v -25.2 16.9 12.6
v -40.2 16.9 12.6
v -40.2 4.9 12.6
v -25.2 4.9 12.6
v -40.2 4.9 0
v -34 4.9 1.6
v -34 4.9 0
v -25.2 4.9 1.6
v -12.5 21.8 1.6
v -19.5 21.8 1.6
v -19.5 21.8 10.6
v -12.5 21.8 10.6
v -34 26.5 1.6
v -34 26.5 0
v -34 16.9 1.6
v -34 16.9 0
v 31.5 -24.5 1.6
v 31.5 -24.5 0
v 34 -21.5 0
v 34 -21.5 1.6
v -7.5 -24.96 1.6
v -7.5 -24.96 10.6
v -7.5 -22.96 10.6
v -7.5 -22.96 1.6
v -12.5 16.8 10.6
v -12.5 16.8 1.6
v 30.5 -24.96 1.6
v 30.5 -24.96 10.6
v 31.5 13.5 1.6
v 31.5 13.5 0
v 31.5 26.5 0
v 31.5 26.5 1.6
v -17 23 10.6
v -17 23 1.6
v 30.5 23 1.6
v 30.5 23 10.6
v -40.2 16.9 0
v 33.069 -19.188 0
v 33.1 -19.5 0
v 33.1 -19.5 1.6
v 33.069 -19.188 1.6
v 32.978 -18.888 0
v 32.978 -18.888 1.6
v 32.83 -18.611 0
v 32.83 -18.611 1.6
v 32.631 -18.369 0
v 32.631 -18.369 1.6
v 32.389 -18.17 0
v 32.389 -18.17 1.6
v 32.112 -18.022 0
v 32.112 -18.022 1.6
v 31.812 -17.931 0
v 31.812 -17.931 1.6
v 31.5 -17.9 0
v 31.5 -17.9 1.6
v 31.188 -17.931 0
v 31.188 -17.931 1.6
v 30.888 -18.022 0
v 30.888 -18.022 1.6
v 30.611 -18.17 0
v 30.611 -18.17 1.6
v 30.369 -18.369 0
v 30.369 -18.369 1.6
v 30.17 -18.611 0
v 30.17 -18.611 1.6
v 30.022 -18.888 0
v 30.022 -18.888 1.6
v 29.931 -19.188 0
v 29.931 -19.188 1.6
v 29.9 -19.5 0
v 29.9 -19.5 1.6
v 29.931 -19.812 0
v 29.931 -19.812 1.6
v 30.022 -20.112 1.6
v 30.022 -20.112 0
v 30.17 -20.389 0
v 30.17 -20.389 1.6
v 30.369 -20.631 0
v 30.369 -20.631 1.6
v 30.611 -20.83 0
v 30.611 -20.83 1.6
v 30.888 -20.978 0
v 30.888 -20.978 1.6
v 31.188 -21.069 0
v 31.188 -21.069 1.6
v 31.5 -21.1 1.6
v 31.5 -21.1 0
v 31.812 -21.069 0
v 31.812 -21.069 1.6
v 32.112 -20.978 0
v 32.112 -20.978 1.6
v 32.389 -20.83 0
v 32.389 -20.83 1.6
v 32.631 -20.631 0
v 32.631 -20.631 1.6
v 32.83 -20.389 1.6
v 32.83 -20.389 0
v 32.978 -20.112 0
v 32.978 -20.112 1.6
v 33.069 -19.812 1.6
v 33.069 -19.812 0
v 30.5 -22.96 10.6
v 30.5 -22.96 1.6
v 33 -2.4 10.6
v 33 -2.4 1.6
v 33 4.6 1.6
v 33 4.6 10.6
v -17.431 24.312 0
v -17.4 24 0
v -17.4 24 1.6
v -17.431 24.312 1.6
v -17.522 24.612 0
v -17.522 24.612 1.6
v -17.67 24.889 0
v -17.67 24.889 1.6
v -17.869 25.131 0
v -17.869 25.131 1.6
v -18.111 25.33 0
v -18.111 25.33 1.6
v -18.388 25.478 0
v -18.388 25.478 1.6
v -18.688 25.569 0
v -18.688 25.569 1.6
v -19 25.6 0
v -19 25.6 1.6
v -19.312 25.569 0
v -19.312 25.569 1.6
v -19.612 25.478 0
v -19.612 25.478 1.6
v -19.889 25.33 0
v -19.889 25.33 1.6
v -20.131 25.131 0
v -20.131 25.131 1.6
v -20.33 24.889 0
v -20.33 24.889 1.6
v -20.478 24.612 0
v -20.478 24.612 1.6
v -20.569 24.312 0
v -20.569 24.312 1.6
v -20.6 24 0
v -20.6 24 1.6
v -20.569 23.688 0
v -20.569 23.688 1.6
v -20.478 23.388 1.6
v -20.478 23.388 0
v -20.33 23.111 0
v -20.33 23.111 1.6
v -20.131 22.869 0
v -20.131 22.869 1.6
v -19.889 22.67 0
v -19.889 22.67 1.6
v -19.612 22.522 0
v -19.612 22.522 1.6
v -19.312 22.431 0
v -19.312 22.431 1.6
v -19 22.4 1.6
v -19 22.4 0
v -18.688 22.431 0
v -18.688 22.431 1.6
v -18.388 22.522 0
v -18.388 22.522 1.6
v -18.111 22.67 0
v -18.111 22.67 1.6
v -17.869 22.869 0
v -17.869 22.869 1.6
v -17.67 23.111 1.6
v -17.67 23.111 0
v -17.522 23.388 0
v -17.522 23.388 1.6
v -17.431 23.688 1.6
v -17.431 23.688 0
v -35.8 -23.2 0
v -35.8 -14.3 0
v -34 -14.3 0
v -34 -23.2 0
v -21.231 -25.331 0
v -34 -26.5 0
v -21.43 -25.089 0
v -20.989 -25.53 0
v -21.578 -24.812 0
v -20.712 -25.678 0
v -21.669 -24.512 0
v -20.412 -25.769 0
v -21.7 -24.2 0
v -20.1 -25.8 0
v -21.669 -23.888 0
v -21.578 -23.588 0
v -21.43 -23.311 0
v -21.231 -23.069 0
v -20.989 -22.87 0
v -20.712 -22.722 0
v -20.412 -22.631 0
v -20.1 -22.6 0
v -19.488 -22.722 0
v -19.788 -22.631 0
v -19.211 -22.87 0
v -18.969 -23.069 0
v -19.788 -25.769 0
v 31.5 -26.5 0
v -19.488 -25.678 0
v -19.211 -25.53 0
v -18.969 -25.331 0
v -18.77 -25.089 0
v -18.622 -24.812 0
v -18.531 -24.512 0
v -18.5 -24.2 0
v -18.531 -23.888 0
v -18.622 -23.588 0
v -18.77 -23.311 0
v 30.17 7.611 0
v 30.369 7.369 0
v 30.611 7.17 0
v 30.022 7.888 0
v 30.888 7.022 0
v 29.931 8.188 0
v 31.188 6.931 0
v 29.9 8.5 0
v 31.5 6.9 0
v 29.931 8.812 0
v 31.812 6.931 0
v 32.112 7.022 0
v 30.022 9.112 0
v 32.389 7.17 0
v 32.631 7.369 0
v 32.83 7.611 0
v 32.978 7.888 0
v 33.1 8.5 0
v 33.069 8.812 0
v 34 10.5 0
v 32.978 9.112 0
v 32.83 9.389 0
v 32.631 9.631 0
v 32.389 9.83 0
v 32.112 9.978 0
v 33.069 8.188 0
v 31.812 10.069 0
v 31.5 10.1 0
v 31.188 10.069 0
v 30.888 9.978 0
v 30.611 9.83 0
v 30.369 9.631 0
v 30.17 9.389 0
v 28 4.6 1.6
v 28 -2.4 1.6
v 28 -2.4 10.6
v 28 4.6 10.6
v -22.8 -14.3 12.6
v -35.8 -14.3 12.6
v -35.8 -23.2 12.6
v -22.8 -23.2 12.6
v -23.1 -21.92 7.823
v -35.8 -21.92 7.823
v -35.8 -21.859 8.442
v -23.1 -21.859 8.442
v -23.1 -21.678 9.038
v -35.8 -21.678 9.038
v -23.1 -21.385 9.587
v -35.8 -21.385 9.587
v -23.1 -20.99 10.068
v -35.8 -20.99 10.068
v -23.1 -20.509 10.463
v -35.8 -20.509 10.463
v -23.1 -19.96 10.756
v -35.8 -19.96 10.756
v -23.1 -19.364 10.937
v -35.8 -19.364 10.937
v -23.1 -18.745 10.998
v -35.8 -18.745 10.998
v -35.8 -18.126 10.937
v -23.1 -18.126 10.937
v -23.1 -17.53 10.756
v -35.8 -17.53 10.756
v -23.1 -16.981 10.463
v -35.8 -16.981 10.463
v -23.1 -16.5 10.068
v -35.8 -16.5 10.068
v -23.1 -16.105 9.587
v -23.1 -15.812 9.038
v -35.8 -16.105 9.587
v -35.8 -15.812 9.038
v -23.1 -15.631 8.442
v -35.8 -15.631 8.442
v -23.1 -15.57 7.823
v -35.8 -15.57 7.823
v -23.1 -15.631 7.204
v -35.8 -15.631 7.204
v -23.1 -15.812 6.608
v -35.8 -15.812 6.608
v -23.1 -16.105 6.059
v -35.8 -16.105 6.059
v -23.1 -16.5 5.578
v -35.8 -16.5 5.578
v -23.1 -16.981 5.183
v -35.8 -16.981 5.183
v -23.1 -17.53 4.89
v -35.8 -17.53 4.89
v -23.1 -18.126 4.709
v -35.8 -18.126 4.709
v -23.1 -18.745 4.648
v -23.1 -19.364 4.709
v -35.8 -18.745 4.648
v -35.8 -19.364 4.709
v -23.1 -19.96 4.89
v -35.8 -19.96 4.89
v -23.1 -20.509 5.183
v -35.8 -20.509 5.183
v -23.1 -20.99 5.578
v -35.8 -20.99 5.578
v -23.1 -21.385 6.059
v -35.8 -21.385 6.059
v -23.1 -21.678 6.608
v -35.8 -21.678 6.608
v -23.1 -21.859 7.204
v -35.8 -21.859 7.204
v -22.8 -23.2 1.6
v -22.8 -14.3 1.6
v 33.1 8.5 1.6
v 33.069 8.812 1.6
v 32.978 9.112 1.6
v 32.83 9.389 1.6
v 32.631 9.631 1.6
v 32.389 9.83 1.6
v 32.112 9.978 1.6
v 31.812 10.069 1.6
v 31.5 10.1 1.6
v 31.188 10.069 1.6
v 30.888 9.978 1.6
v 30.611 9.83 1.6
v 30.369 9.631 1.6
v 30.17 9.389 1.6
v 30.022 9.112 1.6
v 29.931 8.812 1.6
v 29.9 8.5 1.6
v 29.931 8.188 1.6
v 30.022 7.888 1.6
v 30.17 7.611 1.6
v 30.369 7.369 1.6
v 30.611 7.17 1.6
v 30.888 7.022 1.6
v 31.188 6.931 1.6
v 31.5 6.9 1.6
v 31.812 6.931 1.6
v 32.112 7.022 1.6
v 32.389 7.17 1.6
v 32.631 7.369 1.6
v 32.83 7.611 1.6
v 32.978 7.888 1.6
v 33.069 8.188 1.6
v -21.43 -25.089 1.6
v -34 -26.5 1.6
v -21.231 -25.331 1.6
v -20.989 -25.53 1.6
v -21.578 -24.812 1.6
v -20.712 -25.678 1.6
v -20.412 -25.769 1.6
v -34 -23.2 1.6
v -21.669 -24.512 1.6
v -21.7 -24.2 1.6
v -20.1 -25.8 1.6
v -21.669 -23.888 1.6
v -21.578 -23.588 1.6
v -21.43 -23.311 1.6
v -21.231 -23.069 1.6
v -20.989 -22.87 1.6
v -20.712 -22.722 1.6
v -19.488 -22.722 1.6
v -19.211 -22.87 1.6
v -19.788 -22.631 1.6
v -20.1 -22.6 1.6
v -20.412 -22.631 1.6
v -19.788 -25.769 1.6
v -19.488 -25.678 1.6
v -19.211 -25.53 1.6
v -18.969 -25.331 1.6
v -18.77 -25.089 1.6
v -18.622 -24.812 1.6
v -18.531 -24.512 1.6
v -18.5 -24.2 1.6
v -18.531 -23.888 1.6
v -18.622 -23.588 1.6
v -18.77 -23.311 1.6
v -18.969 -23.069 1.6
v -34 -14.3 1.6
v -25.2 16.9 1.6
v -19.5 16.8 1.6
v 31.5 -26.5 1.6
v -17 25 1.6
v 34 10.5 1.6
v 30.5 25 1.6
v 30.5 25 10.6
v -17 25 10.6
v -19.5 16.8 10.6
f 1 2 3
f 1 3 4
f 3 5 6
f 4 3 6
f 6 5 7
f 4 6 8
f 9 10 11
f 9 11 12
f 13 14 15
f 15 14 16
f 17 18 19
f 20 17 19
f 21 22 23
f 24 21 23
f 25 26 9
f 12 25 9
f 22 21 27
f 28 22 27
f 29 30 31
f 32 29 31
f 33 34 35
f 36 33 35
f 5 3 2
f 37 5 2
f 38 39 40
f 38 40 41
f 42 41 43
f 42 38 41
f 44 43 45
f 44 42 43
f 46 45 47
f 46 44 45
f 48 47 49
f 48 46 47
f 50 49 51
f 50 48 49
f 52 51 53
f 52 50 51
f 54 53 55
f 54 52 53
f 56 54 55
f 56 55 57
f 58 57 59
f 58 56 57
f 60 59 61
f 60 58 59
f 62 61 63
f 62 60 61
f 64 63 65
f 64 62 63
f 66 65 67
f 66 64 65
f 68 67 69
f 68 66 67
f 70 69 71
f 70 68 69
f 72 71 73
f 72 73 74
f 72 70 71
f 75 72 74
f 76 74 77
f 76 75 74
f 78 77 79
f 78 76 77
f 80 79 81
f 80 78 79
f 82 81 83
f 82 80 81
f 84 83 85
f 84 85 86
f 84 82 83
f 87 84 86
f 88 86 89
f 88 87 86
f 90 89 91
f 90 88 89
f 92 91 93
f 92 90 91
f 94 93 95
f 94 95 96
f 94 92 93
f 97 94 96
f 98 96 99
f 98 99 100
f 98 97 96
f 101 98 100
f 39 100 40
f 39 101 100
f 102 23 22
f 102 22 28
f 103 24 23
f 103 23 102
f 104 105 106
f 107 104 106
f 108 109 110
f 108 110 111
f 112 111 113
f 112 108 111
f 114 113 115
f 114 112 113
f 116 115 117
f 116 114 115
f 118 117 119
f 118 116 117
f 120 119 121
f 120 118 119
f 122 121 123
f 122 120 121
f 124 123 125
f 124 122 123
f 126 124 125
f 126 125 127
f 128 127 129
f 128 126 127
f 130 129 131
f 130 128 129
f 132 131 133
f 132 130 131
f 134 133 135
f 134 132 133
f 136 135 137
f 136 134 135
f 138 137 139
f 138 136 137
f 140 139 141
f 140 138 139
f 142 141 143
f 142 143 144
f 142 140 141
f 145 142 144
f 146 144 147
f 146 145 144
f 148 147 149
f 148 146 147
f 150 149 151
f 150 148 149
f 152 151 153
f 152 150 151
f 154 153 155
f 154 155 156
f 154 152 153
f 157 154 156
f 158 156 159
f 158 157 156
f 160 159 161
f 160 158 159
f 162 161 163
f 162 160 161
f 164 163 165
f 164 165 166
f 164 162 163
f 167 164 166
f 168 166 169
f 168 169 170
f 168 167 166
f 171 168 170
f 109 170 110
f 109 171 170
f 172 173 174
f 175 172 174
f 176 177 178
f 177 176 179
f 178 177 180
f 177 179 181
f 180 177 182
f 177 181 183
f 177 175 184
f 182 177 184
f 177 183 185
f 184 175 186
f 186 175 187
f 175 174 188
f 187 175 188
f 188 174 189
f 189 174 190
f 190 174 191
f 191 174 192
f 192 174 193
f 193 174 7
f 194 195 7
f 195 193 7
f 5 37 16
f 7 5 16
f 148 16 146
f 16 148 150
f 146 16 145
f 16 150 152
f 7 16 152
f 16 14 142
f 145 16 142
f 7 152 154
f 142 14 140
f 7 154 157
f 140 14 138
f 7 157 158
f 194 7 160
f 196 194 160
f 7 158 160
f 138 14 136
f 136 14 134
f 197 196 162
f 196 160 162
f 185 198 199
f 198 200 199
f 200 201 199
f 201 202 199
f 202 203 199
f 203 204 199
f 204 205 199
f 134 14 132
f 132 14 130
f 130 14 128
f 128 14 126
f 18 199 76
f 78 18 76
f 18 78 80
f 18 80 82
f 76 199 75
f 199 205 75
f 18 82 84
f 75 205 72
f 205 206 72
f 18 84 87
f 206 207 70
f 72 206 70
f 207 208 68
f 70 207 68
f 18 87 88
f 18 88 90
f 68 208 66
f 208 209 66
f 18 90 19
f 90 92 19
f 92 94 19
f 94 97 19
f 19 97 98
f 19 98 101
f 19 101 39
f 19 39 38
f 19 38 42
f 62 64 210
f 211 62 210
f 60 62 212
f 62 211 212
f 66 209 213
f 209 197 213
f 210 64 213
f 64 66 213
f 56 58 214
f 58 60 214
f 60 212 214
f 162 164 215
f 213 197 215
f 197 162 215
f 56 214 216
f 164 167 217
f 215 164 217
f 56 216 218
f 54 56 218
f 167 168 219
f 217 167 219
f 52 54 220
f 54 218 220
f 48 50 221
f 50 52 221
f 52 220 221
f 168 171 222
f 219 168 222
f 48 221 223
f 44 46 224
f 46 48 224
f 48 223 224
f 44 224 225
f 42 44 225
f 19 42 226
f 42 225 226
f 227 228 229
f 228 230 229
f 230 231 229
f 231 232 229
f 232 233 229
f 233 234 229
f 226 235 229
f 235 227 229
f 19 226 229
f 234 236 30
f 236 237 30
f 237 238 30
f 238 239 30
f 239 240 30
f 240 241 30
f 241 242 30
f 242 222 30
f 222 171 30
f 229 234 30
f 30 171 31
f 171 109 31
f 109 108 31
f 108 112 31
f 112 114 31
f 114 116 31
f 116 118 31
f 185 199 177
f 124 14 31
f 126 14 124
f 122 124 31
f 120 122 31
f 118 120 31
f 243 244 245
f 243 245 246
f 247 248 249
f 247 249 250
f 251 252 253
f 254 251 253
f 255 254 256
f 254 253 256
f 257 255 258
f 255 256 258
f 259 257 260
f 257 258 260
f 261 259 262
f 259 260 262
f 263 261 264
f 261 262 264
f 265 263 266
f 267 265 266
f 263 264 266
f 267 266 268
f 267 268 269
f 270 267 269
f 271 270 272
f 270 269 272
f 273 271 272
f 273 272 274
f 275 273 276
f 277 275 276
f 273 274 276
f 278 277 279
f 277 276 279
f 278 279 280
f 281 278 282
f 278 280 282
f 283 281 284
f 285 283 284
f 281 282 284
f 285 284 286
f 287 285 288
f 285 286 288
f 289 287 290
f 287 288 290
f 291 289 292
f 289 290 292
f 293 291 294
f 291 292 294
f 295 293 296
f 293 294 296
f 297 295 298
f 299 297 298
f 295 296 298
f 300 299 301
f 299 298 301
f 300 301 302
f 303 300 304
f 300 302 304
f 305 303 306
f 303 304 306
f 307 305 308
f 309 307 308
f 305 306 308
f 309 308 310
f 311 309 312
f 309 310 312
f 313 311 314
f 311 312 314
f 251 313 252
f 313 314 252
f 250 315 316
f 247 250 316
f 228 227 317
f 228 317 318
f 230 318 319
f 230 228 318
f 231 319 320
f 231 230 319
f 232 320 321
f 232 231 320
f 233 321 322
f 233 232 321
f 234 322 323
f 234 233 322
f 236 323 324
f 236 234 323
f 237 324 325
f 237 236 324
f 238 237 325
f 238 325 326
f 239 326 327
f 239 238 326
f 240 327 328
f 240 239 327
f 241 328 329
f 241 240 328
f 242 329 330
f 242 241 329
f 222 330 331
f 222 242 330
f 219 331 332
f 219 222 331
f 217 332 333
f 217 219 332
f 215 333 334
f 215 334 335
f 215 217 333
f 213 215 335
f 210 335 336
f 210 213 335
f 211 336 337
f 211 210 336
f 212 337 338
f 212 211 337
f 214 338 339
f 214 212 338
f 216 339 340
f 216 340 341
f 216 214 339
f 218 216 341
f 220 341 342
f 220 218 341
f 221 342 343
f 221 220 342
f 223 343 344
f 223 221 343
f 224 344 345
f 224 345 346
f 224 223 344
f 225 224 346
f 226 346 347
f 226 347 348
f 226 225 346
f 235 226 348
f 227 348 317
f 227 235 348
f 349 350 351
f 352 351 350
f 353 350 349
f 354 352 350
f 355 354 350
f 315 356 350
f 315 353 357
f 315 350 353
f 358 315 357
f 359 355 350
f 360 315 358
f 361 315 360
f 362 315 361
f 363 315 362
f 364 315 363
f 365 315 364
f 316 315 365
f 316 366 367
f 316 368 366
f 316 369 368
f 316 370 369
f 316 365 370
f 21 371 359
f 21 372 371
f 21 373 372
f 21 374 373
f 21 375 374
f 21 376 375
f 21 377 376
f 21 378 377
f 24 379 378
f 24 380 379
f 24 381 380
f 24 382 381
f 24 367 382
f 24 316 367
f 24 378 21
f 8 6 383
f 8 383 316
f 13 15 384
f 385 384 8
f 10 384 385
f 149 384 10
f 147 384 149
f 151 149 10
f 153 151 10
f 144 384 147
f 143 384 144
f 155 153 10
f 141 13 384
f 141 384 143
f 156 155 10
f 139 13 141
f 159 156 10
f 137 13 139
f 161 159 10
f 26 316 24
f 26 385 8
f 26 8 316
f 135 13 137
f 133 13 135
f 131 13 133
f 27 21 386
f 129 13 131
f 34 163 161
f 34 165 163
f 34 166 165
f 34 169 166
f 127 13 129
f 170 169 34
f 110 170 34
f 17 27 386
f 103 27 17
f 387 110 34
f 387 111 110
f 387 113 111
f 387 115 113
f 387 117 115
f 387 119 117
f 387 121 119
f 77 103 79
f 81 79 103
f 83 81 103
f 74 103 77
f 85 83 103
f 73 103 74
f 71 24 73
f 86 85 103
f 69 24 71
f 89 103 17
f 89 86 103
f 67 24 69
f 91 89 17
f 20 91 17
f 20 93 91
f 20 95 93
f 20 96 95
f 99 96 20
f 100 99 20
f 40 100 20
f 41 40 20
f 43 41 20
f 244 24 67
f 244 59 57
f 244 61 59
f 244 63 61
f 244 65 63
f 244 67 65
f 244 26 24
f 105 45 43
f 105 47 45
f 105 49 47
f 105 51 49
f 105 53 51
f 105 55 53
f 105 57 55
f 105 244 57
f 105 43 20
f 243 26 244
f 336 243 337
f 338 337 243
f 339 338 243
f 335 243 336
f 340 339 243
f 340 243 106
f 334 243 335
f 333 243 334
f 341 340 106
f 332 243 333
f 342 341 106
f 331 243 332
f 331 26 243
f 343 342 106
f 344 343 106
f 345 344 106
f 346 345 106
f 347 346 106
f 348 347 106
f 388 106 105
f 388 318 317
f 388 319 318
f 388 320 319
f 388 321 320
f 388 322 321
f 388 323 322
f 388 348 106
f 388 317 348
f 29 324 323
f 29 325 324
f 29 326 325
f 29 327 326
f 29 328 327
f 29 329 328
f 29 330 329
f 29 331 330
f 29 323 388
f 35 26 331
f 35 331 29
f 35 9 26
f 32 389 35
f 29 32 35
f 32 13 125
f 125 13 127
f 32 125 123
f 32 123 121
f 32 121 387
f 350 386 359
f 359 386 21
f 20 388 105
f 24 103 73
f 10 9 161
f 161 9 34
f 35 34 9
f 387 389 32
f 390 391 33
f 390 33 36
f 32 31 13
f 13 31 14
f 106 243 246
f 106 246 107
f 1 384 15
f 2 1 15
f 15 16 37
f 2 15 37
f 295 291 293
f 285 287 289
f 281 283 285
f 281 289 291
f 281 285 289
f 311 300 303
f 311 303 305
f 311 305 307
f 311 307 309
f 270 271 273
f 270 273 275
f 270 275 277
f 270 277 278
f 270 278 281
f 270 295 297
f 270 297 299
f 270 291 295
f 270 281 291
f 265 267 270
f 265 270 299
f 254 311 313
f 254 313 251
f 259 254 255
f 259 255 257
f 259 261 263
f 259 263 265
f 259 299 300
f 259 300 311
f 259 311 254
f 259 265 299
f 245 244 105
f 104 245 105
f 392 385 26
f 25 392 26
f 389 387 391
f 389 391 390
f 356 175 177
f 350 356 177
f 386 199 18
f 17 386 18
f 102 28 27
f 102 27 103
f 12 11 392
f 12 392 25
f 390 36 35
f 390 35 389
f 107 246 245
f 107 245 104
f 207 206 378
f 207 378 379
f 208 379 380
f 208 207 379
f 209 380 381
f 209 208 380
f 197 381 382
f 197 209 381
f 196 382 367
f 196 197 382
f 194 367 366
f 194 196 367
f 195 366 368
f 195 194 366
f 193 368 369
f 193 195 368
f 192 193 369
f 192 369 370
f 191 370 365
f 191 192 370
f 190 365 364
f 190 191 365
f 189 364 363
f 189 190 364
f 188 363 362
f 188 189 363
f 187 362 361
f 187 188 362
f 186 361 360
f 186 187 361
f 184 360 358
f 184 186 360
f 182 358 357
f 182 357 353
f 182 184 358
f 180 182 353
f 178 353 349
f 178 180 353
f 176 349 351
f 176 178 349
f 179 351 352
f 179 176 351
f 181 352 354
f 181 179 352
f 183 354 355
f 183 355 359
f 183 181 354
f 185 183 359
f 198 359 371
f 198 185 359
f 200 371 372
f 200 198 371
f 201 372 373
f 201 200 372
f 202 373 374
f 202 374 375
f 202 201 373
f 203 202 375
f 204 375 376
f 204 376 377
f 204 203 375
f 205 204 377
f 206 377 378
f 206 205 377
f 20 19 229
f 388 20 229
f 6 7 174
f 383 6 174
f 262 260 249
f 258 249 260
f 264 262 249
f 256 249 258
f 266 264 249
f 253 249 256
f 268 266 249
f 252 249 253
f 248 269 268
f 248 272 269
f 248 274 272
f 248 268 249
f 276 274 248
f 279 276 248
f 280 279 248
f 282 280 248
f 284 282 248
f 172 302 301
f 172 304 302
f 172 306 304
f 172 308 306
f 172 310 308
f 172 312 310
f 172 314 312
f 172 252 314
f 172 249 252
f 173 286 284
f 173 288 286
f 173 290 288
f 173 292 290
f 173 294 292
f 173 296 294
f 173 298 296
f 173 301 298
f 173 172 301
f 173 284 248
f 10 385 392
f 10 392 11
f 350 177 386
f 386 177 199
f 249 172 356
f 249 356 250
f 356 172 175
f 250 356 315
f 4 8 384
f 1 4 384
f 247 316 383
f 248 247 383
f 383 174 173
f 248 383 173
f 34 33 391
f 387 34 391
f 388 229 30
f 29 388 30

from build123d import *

# Parameters (mm, degrees)
F0_R     = 1.6
F0_W     = 38
F0_H     = 2
F0_W_2   = 7
F0_H_2   = 5
F0_W_3   = 5
F0_H_3   = 7
F0_W_4   = 47.5
F1_DEPTH = 1.6
F0_W_5   = 6.2
F0_H_4   = 12
F0_W_6   = 8.8
F0_W_7   = 1.8
F0_H_5   = 8.9
F0_W_8   = 11.2
F2_DEPTH = 12.6
F3_DEPTH = 10.6
F4_R     = 3.175
F5_DEPTH = 12.7


with BuildPart() as f1:
    # F0 (on Top) → F1 (new body)
    with BuildSketch(Plane.XY):
        Polygon((31.5, 13.5), (31.5, 26.5), (-34, 26.5), (-34, 16.9), (-25.2, 16.9), (-25.2, 4.9), (-34, 4.9), (-34, -14.3), (-22.8, -14.3), (-22.8, -23.2), (-34, -23.2), (-34, -26.5), (31.5, -26.5), (31.5, -24.5), (34, -21.5), (34, 10.5), align=None)
        with Locations((-20.1, -24.2)):
            Circle(F0_R, mode=Mode.SUBTRACT)
        with Locations((11.5, -23.96)):
            Rectangle(F0_W, F0_H, mode=Mode.SUBTRACT)
        with Locations((31.5, -19.5)):
            Circle(F0_R, mode=Mode.SUBTRACT)
        with Locations((-16, 19.3)):
            Rectangle(F0_W_2, F0_H_2, mode=Mode.SUBTRACT)
        with Locations((-19, 24)):
            Circle(F0_R, mode=Mode.SUBTRACT)
        with Locations((30.5, 1.1)):
            Rectangle(F0_W_3, F0_H_3, mode=Mode.SUBTRACT)
        with Locations((31.5, 8.5)):
            Circle(F0_R, mode=Mode.SUBTRACT)
        with Locations((6.75, 24)):
            Rectangle(F0_W_4, F0_H, mode=Mode.SUBTRACT)
    extrude(amount=F1_DEPTH)

    # F0 (on Top) → F2 (join)
    with BuildSketch(Plane.XY):
        with Locations((-37.1, 10.9)):
            Rectangle(F0_W_5, F0_H_4)
        with Locations((-29.6, 10.9)):
            Rectangle(F0_W_6, F0_H_4)
        with Locations((-34.9, -18.75)):
            Rectangle(F0_W_7, F0_H_5)
        with Locations((-28.4, -18.75)):
            Rectangle(F0_W_8, F0_H_5)
    extrude(amount=F2_DEPTH)

    # F0 (on Top) → F3 (join)
    with BuildSketch(Plane.XY):
        with Locations((6.75, 24)):
            Rectangle(F0_W_4, F0_H)
        with Locations((11.5, -23.96)):
            Rectangle(F0_W, F0_H)
        with Locations((-16, 19.3)):
            Rectangle(F0_W_2, F0_H_2)
        with Locations((30.5, 1.1)):
            Rectangle(F0_W_3, F0_H_3)
    extrude(amount=F3_DEPTH)

    # F4 (on face) → F5 (cut)
    with BuildSketch(Plane(origin=(-35.8, 0, 0), x_dir=(0, -1, 0), z_dir=(-1, 0, 0))):
        with Locations((18.745, 7.823)):
            Circle(F4_R)
    extrude(amount=-F5_DEPTH, mode=Mode.SUBTRACT)


solid = f1.part
